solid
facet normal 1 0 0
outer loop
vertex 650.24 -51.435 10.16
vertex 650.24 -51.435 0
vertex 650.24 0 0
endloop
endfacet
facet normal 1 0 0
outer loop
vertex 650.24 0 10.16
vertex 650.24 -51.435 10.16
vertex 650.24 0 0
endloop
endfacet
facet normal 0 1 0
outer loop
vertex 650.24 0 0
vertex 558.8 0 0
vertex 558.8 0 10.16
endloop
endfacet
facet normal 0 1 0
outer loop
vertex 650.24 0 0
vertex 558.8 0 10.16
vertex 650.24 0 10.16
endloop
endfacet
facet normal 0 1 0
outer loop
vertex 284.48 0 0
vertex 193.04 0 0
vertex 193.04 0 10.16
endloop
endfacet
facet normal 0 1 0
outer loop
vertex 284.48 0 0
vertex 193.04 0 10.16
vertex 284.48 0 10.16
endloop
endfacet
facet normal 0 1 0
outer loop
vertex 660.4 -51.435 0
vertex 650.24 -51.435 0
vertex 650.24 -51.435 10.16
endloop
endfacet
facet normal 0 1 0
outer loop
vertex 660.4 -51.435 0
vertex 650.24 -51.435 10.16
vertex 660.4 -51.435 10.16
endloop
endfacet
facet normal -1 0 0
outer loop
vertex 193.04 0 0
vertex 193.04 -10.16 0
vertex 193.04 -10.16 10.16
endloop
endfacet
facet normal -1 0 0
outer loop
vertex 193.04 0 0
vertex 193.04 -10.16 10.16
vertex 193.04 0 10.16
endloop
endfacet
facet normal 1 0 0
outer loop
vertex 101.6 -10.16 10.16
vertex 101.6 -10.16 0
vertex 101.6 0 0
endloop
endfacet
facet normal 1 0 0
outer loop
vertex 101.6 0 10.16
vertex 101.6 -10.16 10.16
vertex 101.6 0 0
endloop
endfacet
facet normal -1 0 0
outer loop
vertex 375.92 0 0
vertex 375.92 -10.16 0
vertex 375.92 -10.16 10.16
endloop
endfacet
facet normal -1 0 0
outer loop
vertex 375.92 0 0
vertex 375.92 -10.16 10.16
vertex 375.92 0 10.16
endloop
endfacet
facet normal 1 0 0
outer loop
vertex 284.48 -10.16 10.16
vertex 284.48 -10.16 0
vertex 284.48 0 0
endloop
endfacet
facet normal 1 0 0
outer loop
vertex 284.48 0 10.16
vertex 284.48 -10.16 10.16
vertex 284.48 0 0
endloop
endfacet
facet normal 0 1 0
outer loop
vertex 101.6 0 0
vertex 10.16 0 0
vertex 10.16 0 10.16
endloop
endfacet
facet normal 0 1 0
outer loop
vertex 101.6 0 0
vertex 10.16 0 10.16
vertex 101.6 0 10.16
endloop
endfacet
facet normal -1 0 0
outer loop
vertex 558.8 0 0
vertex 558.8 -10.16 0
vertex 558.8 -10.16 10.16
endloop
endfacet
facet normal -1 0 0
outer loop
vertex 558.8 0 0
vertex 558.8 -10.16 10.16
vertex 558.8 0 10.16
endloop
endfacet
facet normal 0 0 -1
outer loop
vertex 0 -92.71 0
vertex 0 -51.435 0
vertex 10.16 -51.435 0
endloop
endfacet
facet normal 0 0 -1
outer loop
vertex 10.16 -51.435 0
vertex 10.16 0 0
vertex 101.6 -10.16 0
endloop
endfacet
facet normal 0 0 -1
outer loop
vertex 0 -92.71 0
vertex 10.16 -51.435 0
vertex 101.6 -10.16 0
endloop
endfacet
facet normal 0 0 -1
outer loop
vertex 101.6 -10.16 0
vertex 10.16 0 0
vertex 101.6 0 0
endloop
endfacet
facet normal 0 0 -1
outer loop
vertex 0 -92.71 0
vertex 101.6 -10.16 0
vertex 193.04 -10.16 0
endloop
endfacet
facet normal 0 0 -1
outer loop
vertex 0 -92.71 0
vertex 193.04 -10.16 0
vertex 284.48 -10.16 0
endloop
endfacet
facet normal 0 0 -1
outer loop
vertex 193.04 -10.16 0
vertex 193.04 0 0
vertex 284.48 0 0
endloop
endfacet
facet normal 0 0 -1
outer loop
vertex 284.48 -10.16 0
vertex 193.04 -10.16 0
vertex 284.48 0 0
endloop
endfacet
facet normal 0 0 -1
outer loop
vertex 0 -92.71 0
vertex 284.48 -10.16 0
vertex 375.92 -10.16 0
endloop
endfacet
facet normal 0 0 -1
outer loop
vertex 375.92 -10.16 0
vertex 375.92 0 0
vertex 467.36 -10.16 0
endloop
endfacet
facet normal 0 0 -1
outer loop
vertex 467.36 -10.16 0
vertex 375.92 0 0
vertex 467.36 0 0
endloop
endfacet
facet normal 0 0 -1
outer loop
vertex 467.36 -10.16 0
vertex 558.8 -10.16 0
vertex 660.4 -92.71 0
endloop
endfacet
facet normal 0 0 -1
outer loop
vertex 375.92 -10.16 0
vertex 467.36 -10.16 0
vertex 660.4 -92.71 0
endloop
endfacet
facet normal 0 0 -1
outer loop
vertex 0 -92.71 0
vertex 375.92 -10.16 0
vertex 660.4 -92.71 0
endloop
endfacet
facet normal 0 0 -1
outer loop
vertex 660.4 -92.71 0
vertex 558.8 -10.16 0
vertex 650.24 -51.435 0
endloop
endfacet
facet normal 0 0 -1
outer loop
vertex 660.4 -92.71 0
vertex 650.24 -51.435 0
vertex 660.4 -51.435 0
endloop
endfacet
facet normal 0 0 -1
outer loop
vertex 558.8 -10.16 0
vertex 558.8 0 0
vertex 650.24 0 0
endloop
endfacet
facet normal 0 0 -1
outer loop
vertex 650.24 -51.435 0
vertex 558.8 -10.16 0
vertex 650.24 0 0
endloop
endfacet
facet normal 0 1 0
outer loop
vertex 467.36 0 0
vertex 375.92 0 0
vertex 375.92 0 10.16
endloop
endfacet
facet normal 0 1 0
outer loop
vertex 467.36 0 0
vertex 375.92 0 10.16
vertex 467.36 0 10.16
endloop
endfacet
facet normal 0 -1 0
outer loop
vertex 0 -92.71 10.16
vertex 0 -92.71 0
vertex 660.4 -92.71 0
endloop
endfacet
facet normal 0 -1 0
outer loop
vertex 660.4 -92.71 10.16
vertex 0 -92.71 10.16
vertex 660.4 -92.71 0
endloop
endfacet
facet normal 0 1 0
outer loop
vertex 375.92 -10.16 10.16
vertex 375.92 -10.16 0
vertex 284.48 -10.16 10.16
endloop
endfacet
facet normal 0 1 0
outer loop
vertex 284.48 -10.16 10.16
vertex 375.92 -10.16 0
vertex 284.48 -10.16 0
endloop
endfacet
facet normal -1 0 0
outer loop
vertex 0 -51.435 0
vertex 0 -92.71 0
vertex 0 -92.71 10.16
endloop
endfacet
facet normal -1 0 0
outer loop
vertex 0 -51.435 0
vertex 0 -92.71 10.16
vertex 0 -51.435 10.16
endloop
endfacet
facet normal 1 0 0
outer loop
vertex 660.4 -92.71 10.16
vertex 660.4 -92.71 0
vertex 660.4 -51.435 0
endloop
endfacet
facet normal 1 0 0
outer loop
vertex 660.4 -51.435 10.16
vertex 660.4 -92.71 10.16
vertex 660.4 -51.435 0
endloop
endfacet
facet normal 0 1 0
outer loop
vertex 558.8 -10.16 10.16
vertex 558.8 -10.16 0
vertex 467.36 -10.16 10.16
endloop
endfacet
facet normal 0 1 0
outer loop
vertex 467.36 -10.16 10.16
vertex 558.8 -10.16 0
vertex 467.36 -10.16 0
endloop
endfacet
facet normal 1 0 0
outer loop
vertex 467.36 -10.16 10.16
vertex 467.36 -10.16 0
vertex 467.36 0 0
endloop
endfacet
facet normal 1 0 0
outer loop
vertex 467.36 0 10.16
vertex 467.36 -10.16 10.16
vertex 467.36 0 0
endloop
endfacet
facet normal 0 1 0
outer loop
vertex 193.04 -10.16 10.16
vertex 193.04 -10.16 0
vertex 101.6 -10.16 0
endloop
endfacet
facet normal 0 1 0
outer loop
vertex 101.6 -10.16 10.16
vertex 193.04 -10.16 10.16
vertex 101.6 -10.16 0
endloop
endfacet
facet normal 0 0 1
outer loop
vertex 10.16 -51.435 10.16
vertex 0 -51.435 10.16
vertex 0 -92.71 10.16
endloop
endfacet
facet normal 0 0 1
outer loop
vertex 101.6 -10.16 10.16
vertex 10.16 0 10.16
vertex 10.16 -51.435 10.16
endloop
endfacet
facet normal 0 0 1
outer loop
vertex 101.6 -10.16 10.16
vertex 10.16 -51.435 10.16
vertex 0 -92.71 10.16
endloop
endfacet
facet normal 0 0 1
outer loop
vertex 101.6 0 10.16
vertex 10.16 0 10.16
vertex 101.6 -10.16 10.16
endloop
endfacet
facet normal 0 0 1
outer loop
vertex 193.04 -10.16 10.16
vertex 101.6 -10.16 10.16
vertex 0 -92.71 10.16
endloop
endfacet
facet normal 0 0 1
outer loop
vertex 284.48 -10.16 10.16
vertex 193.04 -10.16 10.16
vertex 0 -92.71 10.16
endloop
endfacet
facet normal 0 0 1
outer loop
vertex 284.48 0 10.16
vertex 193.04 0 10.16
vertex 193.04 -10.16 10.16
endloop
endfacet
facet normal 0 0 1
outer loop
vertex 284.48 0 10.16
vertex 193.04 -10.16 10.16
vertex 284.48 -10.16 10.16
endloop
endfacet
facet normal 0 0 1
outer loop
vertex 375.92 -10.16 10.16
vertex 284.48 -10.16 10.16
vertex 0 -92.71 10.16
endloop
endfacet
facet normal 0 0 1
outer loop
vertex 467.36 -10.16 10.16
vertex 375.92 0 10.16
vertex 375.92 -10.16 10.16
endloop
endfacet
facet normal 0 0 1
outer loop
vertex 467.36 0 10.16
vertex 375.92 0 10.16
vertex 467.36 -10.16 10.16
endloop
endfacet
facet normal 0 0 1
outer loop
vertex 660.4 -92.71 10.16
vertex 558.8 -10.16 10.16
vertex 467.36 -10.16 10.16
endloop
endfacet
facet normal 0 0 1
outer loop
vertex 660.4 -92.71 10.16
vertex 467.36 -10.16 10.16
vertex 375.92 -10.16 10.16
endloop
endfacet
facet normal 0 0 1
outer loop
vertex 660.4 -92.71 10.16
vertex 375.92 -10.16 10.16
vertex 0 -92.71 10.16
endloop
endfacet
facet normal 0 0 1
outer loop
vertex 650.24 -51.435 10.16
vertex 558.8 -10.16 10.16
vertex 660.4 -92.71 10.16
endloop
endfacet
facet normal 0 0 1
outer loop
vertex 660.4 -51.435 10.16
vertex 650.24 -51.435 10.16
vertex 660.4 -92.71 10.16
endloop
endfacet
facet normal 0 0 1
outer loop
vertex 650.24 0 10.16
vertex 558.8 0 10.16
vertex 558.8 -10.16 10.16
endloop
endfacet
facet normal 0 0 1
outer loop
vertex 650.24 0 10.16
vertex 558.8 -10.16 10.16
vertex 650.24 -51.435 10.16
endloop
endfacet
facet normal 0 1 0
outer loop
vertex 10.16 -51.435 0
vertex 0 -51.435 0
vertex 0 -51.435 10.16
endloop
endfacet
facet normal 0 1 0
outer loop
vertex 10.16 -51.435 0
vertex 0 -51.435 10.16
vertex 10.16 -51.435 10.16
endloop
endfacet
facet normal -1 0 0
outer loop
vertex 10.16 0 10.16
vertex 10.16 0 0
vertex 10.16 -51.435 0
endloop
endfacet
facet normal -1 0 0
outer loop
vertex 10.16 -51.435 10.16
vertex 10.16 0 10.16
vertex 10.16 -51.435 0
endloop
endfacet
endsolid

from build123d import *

# Parameters (mm, degrees)
SKETCH1_W           = 10.16
SKETCH1_H           = 41.275
SKETCH1_W_2         = 91.44
SKETCH1_H_2         = 10.16
BOSS_EXTRUDE1_DEPTH = 10.16


with BuildPart() as part:
    # Sketch1 → Boss-Extrude1 (new body)
    with BuildSketch(Plane.XY):
        Polygon((193.04, -10.16), (101.6, -10.16), (10.16, -10.16), (10.16, -51.435), (10.16, -92.71), (650.24, -92.71), (650.24, -51.435), (650.24, -10.16), (558.8, -10.16), (467.36, -10.16), (375.92, -10.16), (284.48, -10.16), align=None)
        with Locations((655.32, -72.0725)):
            Rectangle(SKETCH1_W, SKETCH1_H)
        with Locations((604.52, -5.08)):
            Rectangle(SKETCH1_W_2, SKETCH1_H_2)
        with Locations((421.64, -5.08)):
            Rectangle(SKETCH1_W_2, SKETCH1_H_2)
        with Locations((238.76, -5.08)):
            Rectangle(SKETCH1_W_2, SKETCH1_H_2)
        with Locations((55.88, -5.08)):
            Rectangle(SKETCH1_W_2, SKETCH1_H_2)
        with Locations((5.08, -72.0725)):
            Rectangle(SKETCH1_W, SKETCH1_H)
    extrude(amount=BOSS_EXTRUDE1_DEPTH)


solid = part.part
